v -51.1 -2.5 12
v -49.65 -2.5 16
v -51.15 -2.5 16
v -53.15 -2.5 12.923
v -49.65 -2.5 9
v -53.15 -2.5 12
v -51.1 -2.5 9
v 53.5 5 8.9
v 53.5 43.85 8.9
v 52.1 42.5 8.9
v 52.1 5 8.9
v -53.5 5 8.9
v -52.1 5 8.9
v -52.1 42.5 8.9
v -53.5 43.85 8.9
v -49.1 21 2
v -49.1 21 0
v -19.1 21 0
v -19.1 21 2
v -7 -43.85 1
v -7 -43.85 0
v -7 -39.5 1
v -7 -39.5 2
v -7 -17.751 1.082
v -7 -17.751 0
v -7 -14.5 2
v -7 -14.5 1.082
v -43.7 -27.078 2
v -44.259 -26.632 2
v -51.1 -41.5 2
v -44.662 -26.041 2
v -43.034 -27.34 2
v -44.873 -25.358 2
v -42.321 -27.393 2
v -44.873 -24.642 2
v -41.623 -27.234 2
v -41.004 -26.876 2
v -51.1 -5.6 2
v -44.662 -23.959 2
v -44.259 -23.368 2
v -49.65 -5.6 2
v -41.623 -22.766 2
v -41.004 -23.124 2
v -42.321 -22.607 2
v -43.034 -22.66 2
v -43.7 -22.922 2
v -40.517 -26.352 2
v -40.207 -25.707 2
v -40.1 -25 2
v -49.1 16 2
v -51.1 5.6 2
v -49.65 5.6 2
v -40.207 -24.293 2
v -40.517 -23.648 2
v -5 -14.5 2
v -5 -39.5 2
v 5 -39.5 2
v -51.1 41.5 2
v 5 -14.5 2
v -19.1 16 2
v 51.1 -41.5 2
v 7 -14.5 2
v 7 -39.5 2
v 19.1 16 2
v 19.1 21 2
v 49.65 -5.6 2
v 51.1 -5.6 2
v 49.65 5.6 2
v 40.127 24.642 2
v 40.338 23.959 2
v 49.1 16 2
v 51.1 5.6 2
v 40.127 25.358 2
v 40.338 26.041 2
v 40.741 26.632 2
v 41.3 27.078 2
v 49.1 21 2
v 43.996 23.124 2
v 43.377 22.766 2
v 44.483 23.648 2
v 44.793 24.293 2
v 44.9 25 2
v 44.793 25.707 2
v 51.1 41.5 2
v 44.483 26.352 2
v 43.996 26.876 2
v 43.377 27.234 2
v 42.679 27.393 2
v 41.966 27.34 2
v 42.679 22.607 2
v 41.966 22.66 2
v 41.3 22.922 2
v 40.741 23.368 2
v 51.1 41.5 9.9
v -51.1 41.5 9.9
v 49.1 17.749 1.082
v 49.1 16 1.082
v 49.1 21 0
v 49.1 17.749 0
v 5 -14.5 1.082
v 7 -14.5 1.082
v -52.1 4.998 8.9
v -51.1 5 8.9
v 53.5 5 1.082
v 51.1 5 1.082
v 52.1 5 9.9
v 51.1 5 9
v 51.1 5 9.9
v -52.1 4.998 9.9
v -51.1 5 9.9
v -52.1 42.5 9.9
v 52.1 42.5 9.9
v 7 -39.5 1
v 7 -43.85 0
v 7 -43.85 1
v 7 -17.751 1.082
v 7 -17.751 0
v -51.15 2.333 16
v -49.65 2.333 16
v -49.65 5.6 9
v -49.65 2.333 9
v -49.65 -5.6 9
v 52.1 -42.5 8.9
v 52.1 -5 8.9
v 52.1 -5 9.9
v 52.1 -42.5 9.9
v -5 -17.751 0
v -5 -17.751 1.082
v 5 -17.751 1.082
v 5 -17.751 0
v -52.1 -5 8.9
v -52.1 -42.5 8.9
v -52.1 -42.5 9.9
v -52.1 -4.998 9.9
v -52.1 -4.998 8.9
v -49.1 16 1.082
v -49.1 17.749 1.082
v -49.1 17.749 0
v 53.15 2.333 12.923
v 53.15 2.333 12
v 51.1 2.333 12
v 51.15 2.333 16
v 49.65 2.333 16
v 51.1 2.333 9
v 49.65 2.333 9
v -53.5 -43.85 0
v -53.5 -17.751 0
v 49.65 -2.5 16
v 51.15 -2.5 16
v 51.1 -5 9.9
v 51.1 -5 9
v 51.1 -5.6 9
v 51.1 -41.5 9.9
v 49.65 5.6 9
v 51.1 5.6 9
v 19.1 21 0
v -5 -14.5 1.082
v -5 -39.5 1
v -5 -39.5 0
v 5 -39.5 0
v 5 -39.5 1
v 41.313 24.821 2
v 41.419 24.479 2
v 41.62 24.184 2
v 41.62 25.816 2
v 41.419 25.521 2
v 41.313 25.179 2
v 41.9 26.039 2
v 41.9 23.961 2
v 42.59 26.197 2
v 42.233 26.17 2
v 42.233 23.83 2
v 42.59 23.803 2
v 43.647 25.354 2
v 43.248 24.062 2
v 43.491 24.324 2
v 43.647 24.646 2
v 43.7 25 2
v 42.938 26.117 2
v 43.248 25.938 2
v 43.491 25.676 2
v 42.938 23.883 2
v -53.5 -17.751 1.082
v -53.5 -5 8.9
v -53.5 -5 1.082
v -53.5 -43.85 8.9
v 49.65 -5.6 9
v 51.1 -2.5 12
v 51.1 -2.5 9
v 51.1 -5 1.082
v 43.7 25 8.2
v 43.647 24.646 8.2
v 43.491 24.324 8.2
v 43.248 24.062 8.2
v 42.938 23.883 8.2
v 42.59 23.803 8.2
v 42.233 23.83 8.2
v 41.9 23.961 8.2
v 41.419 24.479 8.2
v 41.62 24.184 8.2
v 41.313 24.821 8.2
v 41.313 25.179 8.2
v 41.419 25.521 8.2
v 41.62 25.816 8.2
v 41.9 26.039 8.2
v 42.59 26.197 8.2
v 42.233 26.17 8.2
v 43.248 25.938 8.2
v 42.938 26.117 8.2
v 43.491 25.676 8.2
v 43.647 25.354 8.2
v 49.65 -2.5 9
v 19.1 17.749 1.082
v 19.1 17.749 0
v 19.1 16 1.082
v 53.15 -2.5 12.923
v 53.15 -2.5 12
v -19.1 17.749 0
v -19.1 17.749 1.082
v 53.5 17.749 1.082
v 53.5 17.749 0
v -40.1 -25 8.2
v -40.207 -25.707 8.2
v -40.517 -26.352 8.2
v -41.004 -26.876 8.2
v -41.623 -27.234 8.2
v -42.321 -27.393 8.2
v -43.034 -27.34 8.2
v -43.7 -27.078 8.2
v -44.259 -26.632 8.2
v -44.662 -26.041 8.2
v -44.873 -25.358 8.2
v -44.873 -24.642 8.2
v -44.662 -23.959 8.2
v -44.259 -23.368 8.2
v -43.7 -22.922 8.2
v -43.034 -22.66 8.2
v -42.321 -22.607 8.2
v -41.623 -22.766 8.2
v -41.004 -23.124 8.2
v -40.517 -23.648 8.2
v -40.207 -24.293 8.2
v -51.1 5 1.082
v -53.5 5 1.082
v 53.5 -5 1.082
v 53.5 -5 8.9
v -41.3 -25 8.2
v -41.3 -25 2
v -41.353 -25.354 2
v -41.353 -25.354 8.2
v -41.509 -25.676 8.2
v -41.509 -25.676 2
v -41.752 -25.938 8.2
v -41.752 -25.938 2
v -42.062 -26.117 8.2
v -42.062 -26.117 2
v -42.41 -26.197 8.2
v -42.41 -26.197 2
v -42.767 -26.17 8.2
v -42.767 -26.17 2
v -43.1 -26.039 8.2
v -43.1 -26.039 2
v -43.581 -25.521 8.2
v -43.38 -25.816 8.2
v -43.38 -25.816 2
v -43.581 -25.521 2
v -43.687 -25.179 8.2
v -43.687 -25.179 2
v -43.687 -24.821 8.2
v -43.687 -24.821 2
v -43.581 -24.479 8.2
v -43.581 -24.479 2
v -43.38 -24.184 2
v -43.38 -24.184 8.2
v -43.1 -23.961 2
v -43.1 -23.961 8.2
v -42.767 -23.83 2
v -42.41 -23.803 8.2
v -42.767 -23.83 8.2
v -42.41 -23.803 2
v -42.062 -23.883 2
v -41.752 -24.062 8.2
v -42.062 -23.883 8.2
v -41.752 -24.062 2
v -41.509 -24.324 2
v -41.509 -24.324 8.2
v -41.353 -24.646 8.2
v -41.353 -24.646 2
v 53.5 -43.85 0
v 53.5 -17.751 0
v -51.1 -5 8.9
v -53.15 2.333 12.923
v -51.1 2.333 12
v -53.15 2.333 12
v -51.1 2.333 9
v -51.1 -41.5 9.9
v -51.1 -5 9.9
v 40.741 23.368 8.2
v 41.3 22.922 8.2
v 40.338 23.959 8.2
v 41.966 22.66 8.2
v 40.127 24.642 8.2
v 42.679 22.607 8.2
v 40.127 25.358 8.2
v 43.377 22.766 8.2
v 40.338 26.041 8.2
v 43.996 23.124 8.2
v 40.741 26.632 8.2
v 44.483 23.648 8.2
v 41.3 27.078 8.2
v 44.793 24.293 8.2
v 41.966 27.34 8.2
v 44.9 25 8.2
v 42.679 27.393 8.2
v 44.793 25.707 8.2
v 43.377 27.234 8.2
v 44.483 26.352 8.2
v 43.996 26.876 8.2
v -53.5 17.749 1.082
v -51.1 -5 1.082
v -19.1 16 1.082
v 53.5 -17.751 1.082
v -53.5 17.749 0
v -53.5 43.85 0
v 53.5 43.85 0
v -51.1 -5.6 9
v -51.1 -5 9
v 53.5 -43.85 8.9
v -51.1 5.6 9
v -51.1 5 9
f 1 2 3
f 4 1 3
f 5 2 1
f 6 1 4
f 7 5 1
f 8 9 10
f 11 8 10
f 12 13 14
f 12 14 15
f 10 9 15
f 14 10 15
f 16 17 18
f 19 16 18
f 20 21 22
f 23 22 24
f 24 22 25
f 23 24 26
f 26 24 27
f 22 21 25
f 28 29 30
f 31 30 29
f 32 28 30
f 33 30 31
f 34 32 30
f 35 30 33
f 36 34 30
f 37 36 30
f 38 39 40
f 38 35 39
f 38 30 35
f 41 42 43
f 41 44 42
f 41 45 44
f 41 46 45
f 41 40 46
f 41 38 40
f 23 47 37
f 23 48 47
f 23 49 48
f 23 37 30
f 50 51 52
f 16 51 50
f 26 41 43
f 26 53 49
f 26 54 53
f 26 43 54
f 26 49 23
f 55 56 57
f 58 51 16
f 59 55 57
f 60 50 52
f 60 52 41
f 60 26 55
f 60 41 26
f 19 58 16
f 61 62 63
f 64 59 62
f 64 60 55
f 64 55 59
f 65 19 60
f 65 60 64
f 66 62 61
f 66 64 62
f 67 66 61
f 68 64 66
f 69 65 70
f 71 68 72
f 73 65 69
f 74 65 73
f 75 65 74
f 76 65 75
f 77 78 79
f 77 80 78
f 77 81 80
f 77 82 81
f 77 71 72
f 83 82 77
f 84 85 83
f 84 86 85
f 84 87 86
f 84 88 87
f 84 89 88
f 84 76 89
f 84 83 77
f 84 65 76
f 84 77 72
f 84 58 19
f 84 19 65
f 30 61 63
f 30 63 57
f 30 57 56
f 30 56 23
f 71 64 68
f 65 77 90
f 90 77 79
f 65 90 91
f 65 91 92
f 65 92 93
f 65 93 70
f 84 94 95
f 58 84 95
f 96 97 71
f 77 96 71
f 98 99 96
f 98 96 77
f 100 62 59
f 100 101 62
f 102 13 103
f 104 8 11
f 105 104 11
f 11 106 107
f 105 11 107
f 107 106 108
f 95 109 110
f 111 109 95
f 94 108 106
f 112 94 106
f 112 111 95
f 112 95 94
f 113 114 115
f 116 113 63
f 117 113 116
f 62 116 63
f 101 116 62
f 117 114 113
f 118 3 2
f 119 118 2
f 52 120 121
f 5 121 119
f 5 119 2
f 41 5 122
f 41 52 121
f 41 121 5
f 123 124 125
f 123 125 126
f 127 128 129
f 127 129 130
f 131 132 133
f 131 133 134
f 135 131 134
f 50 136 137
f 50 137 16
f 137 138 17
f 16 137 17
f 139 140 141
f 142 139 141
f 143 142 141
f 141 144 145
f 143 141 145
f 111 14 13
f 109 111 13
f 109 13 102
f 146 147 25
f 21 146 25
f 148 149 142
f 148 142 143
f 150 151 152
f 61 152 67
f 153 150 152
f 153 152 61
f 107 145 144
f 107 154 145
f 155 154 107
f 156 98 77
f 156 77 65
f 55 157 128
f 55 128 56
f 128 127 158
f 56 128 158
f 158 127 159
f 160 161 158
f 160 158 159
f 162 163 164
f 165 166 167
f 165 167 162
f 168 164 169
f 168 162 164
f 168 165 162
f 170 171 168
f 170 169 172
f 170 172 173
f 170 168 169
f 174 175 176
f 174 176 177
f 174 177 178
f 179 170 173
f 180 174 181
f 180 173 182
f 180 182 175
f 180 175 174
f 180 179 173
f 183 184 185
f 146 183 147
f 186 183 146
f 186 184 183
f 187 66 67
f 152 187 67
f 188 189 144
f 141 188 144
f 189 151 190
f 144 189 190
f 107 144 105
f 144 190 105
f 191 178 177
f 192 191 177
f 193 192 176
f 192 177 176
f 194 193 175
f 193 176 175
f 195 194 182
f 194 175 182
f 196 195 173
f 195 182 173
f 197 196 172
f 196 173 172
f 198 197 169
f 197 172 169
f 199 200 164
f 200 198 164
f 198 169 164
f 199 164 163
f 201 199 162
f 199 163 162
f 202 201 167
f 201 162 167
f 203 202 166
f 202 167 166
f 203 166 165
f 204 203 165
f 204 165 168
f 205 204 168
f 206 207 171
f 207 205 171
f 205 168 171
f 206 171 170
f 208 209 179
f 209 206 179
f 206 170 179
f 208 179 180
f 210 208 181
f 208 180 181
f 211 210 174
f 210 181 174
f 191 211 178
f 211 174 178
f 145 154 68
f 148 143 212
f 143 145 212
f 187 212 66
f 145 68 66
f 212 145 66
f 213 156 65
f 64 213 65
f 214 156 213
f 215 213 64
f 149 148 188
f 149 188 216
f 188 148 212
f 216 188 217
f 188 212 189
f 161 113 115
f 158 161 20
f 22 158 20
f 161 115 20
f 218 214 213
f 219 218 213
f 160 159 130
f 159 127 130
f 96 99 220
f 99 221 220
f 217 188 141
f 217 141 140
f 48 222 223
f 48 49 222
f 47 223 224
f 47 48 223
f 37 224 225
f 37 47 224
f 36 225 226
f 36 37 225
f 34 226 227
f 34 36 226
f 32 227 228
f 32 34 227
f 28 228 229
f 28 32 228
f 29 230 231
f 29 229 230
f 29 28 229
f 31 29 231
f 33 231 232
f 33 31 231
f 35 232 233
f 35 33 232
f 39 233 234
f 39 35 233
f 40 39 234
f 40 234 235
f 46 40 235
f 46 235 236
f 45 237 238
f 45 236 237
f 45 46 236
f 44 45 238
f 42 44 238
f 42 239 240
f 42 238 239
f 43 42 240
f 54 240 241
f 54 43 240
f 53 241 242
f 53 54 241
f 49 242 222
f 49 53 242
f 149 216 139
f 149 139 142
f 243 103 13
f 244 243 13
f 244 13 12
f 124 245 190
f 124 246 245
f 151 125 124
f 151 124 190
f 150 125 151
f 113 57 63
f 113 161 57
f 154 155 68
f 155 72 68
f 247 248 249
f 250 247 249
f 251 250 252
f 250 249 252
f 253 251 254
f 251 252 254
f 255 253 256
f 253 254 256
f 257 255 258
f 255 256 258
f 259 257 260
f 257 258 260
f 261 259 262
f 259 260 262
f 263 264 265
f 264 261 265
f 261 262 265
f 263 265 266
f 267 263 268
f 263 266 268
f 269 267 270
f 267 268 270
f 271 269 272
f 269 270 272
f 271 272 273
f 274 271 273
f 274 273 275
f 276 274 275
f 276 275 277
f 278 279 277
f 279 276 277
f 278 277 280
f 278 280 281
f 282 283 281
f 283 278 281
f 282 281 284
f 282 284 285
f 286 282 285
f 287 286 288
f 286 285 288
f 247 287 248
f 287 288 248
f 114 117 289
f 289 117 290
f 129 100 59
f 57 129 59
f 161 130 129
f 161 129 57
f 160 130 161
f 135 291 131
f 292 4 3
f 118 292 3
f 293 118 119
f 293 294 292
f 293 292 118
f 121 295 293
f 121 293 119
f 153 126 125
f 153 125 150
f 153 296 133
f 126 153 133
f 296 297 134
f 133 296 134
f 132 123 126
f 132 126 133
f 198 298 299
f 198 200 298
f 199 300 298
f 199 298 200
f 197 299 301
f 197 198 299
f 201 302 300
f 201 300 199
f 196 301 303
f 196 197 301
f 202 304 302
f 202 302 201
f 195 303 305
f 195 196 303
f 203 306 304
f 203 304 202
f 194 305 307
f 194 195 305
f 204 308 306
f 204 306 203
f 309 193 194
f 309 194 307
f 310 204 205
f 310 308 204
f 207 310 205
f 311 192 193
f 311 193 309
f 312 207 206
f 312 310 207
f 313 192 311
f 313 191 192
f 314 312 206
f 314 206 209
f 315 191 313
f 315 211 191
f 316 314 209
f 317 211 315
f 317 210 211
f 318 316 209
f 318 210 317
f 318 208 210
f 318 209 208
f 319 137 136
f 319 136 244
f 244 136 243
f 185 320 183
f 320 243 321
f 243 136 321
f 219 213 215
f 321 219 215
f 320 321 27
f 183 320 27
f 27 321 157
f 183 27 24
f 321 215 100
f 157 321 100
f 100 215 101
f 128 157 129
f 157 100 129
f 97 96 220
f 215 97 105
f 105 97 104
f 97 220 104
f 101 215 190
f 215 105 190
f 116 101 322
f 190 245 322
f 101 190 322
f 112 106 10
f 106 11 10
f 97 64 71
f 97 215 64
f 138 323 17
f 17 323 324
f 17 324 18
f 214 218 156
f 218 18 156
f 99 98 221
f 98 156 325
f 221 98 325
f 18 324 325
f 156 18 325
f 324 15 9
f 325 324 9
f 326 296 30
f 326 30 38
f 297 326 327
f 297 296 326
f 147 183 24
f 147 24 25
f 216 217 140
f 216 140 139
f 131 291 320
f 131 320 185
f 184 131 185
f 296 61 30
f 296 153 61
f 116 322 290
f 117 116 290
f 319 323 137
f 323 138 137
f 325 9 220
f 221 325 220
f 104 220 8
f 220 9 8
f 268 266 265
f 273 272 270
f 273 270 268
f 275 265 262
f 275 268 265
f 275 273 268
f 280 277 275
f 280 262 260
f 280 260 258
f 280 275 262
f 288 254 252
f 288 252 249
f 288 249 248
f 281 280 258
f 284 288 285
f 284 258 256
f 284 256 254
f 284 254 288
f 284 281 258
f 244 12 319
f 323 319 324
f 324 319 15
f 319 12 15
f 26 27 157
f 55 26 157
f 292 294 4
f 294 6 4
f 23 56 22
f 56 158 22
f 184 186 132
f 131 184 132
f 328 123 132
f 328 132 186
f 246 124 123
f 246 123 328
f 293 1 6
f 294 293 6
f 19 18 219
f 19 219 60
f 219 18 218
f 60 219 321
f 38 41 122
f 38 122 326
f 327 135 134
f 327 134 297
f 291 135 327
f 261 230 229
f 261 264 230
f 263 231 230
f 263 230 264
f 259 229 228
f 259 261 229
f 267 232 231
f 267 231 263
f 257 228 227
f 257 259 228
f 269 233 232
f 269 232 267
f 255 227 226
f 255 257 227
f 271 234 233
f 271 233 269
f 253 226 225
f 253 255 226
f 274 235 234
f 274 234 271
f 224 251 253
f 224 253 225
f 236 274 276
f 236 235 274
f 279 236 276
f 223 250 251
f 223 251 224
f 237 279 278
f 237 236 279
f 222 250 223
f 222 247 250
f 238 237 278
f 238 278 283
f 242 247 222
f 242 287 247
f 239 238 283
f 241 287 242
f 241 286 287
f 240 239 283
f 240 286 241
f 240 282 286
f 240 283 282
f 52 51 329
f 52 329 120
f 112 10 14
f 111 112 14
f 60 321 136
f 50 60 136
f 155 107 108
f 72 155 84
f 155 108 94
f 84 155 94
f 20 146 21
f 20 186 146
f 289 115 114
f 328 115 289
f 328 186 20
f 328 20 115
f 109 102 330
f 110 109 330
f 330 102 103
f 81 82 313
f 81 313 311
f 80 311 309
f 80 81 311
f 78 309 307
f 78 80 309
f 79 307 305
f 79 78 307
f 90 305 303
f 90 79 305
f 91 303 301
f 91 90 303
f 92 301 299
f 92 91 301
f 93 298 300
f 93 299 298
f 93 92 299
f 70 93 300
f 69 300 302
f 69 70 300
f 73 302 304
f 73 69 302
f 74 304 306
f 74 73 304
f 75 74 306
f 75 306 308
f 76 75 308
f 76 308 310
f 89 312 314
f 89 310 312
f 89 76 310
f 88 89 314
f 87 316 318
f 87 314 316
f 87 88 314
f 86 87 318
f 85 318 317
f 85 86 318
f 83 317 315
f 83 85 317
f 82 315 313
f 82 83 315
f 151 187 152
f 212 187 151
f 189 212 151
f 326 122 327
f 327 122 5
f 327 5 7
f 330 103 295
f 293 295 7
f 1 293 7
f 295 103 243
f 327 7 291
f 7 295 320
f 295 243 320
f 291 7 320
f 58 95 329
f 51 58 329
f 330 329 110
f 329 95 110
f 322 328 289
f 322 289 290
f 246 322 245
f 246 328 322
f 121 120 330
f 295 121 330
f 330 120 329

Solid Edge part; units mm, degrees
sketch "Sketch1" plane through (0, 0, 0) normal (0, 0, 1) x (1, 0, 0)
  line L0 (49.1, 16) -> (49.1, 21)
  line L1 (49.1, 21) -> (19.1, 21)
  line L2 (19.1, 21) -> (19.1, 16)
  line L3 (19.1, 16) -> (49.1, 16)
  line L4 (5, -39.5) -> (7, -39.5)
  line L5 (7, -39.5) -> (7, -14.5)
  line L6 (7, -14.5) -> (5, -14.5)
  line L7 (5, -14.5) -> (5, -39.5)
  line L8 (51.1, 41.5) -> (-51.1, 41.5)
  line L9 (-51.1, 41.5) -> (-51.1, -41.5)
  line L10 (-51.1, -41.5) -> (51.1, -41.5)
  line L11 (51.1, -41.5) -> (51.1, 41.5)
  line L12 (-19.1, 16) -> (-49.1, 16)
  line L13 (-49.1, 16) -> (-49.1, 21)
  line L14 (-49.1, 21) -> (-19.1, 21)
  line L15 (-19.1, 21) -> (-19.1, 16)
  line L16 (-5, -39.5) -> (-7, -39.5)
  line L17 (-7, -39.5) -> (-7, -14.5)
  line L18 (-7, -14.5) -> (-5, -14.5)
  line L19 (-5, -14.5) -> (-5, -39.5)
  dimension "D1" = 30
  dimension "D2" = 2
  dimension "D3" = 5
  dimension "D4" = 16
  dimension "D5" = 2
  dimension "D6" = 25
  dimension "D7" = 2
  dimension "D8" = 5
extrude "Protrusion1" add sketch "Sketch1" along normal blind 2
sketch "Sketch2" plane through (0, 0, 2) normal (0, 0, 1) x (1, 0, 0)
  circle A0 centre (-42.5, -25) radius 1.2
  circle A1 centre (-42.5, -25) radius 2.4
  circle A2 centre (42.5, 25) radius 2.4
  circle A3 centre (42.5, 25) radius 1.2
  dimension "D1" = 2.4
  dimension "D2" = 25
  dimension "D3" = 42.5
  dimension "D4" = 25
  dimension "D5" = 42.5
  dimension "D6" = 2.4
  dimension "D7" = 4.8
extrude "ProtrusiónExtruida_2" add sketch "Sketch2" along normal blind 6.2
sketch "Sketch3" plane through (0, 0, 2) normal (0, 0, 1) x (1, 0, 0)
  line L0 (51.1, 41.5) -> (-51.1, 41.5)
  line L1 (-51.1, 41.5) -> (-51.1, 5)
  line L2 (-51.1, 5) -> (-53.5, 5)
  line L3 (-53.5, 5) -> (-53.5, 43.85)
  line L4 (-53.5, 43.85) -> (53.5, 43.85)
  line L5 (53.5, 43.85) -> (53.5, 5)
  line L6 (53.5, 5) -> (51.1, 5)
  line L7 (51.1, 5) -> (51.1, 41.5)
  line L8 (-53.5, -43.85) -> (53.5, -43.85)
  line L9 (53.5, -43.85) -> (53.5, -5)
  line L10 (53.5, -5) -> (51.1, -5)
  line L11 (51.1, -5) -> (51.1, -41.5)
  line L12 (51.1, -41.5) -> (-51.1, -41.5)
  line L13 (-51.1, -41.5) -> (-51.1, -5)
  line L14 (-51.1, -5) -> (-53.5, -5)
  line L15 (-53.5, -5) -> (-53.5, -43.85)
  dimension "D1" = 5
  dimension "D2" = 107
  dimension "D3" = 53.5
  dimension "D4" = 43.85
  dimension "D5" = 2.4
extrude "ProtrusiónExtruida_7" add sketch "Sketch3" against normal blind 2 and the other way blind 6.9
sketch "Sketch4" plane through (0, -24.425, 8.9) normal (0, 0, 1) x (1, 0, 0)
  line L0 (-51.1, 29.425) -> (-51.1, 65.925)
  line L1 (-51.1, 65.925) -> (51.1, 65.925)
  line L2 (51.1, 65.925) -> (51.1, 29.425)
  line L3 (51.1, 29.425) -> (52.1, 29.425)
  line L4 (52.1, 29.425) -> (52.1, 66.925)
  line L5 (52.1, 66.925) -> (-52.1, 66.925)
  line L6 (-52.1, 66.925) -> (-52.1, 29.423)
  line L7 (-52.1, 29.423) -> (-51.1, 29.425)
  line L8 (52.1, -18.075) -> (-52.1, -18.075)
  line L9 (-52.1, -18.075) -> (-52.1, 19.427)
  line L10 (-52.1, 19.427) -> (-51.1, 19.425)
  line L11 (-51.1, 19.425) -> (-51.1, -17.075)
  line L12 (-51.1, -17.075) -> (51.1, -17.075)
  line L13 (51.1, -17.075) -> (51.1, 19.425)
  line L14 (51.1, 19.425) -> (52.1, 19.425)
  line L15 (52.1, 19.425) -> (52.1, -18.075)
  dimension "D1" = 5
  dimension "D2" = 104.2
  dimension "D3" = 52.1
  dimension "D4" = 102.2
  dimension "D5" = 51.1
  dimension "D6" = 42.5
  dimension "D7" = 5
  dimension "D8" = 1
extrude "ProtrusiónExtruida_8" add sketch "Sketch4" along normal blind 1
sketch "Sketch5" plane through (0, 0, 2) normal (0, 0, 1) x (1, 0, 0)
  line L0 (-49.65, 5.6) -> (-49.65, -5.6)
  line L1 (-49.65, -5.6) -> (-51.1, -5.6)
  line L2 (-51.1, -5.6) -> (-51.1, 5.6)
  line L3 (-51.1, 5.6) -> (-49.65, 5.6)
  line L4 (49.65, 5.6) -> (49.65, -5.6)
  line L5 (49.65, -5.6) -> (51.1, -5.6)
  line L6 (51.1, -5.6) -> (51.1, 5.6)
  line L7 (51.1, 5.6) -> (49.65, 5.6)
  dimension "D1" = 11.2
  dimension "D2" = 1.45
  dimension "D3" = 5.6
  dimension "D4" = 51.1
extrude "ProtrusiónExtruida_9" add sketch "Sketch5" along normal blind 7
sketch "Sketch6" plane through (50.375, 0, 9) normal (0, 0, 1) x (0, 1, 0)
  line L0 (2.3332, 0.725) -> (-2.5, 0.725)
  line L1 (-2.5, 0.725) -> (-2.5, -0.725)
  line L2 (-2.5, -0.725) -> (2.3332, -0.725)
  line L3 (2.3332, -0.725) -> (2.3332, 0.725)
  line L4 (-2.5, 101.475) -> (2.3332, 101.475)
  line L5 (2.3332, 101.475) -> (2.3332, 100.025)
  line L6 (2.3332, 100.025) -> (-2.5, 100.025)
  line L7 (-2.5, 100.025) -> (-2.5, 101.475)
  dimension "D1" = 2.5
extrude "Protrusion2" add sketch "Sketch6" along normal blind 3
sketch "Sketch7" plane through (-50.375, -2.5, 14.95) normal (0, -1, 0) x (0, 0, 1)
  line L0 (1.05, -0.725) -> (-2.95, -0.725)
  line L1 (-2.95, -0.725) -> (-2.95, 0.725)
  line L2 (-2.95, 0.725) -> (-2.95, 2.775)
  line L3 (-2.95, 2.775) -> (-2.0269, 2.775)
  line L4 (-2.0269, 2.775) -> (1.05, 0.775)
  line L5 (1.05, 0.775) -> (1.05, -0.725)
extrude "Protrusion3" add sketch "Sketch7" against normal up to surface (4.8332 mm away)
sketch "Sketch8" plane through (-50.375, -2.5, 14.95) normal (0, -1, 0) x (0, 0, 1)
  line L0 (-2.95, -100.025) -> (-2.95, -101.475)
  line L1 (-2.95, -101.475) -> (-2.95, -103.525)
  line L2 (-2.95, -103.525) -> (-2.0269, -103.525)
  line L3 (-2.0269, -103.525) -> (1.05, -101.525)
  line L4 (1.05, -101.525) -> (1.05, -100.025)
  line L5 (1.05, -100.025) -> (-2.95, -100.025)
extrude "Protrusion4" add sketch "Sketch8" against normal up to surface (4.8332 mm away)
sketch "Sketch9" plane through (51.1, 0, 6) normal (1, 0, 0) x (0, 1, 0)
  line L0 (-17.7511, -6) -> (17.7489, -6)
  line L1 (17.7489, -6) -> (17.7489, -4.918)
  line L2 (17.7489, -4.918) -> (-17.7511, -4.918)
  line L3 (-17.7511, -4.918) -> (-17.7511, -6)
extrude "Cutout1" cut sketch "Sketch9" against normal up to surface (107 mm away) from surface at 2.4
sketch "Sketch10" plane through (0, -43.85, 4.45) normal (0, -1, 0) x (1, 0, 0)
  line L0 (7, -3.45) -> (-7, -3.45)
  line L1 (-7, -3.45) -> (-7, -4.45)
  line L2 (-7, -4.45) -> (7, -4.45)
  line L3 (7, -4.45) -> (7, -3.45)
extrude "Cutout2" cut sketch "Sketch10" against normal up to surface (4.35 mm away)
